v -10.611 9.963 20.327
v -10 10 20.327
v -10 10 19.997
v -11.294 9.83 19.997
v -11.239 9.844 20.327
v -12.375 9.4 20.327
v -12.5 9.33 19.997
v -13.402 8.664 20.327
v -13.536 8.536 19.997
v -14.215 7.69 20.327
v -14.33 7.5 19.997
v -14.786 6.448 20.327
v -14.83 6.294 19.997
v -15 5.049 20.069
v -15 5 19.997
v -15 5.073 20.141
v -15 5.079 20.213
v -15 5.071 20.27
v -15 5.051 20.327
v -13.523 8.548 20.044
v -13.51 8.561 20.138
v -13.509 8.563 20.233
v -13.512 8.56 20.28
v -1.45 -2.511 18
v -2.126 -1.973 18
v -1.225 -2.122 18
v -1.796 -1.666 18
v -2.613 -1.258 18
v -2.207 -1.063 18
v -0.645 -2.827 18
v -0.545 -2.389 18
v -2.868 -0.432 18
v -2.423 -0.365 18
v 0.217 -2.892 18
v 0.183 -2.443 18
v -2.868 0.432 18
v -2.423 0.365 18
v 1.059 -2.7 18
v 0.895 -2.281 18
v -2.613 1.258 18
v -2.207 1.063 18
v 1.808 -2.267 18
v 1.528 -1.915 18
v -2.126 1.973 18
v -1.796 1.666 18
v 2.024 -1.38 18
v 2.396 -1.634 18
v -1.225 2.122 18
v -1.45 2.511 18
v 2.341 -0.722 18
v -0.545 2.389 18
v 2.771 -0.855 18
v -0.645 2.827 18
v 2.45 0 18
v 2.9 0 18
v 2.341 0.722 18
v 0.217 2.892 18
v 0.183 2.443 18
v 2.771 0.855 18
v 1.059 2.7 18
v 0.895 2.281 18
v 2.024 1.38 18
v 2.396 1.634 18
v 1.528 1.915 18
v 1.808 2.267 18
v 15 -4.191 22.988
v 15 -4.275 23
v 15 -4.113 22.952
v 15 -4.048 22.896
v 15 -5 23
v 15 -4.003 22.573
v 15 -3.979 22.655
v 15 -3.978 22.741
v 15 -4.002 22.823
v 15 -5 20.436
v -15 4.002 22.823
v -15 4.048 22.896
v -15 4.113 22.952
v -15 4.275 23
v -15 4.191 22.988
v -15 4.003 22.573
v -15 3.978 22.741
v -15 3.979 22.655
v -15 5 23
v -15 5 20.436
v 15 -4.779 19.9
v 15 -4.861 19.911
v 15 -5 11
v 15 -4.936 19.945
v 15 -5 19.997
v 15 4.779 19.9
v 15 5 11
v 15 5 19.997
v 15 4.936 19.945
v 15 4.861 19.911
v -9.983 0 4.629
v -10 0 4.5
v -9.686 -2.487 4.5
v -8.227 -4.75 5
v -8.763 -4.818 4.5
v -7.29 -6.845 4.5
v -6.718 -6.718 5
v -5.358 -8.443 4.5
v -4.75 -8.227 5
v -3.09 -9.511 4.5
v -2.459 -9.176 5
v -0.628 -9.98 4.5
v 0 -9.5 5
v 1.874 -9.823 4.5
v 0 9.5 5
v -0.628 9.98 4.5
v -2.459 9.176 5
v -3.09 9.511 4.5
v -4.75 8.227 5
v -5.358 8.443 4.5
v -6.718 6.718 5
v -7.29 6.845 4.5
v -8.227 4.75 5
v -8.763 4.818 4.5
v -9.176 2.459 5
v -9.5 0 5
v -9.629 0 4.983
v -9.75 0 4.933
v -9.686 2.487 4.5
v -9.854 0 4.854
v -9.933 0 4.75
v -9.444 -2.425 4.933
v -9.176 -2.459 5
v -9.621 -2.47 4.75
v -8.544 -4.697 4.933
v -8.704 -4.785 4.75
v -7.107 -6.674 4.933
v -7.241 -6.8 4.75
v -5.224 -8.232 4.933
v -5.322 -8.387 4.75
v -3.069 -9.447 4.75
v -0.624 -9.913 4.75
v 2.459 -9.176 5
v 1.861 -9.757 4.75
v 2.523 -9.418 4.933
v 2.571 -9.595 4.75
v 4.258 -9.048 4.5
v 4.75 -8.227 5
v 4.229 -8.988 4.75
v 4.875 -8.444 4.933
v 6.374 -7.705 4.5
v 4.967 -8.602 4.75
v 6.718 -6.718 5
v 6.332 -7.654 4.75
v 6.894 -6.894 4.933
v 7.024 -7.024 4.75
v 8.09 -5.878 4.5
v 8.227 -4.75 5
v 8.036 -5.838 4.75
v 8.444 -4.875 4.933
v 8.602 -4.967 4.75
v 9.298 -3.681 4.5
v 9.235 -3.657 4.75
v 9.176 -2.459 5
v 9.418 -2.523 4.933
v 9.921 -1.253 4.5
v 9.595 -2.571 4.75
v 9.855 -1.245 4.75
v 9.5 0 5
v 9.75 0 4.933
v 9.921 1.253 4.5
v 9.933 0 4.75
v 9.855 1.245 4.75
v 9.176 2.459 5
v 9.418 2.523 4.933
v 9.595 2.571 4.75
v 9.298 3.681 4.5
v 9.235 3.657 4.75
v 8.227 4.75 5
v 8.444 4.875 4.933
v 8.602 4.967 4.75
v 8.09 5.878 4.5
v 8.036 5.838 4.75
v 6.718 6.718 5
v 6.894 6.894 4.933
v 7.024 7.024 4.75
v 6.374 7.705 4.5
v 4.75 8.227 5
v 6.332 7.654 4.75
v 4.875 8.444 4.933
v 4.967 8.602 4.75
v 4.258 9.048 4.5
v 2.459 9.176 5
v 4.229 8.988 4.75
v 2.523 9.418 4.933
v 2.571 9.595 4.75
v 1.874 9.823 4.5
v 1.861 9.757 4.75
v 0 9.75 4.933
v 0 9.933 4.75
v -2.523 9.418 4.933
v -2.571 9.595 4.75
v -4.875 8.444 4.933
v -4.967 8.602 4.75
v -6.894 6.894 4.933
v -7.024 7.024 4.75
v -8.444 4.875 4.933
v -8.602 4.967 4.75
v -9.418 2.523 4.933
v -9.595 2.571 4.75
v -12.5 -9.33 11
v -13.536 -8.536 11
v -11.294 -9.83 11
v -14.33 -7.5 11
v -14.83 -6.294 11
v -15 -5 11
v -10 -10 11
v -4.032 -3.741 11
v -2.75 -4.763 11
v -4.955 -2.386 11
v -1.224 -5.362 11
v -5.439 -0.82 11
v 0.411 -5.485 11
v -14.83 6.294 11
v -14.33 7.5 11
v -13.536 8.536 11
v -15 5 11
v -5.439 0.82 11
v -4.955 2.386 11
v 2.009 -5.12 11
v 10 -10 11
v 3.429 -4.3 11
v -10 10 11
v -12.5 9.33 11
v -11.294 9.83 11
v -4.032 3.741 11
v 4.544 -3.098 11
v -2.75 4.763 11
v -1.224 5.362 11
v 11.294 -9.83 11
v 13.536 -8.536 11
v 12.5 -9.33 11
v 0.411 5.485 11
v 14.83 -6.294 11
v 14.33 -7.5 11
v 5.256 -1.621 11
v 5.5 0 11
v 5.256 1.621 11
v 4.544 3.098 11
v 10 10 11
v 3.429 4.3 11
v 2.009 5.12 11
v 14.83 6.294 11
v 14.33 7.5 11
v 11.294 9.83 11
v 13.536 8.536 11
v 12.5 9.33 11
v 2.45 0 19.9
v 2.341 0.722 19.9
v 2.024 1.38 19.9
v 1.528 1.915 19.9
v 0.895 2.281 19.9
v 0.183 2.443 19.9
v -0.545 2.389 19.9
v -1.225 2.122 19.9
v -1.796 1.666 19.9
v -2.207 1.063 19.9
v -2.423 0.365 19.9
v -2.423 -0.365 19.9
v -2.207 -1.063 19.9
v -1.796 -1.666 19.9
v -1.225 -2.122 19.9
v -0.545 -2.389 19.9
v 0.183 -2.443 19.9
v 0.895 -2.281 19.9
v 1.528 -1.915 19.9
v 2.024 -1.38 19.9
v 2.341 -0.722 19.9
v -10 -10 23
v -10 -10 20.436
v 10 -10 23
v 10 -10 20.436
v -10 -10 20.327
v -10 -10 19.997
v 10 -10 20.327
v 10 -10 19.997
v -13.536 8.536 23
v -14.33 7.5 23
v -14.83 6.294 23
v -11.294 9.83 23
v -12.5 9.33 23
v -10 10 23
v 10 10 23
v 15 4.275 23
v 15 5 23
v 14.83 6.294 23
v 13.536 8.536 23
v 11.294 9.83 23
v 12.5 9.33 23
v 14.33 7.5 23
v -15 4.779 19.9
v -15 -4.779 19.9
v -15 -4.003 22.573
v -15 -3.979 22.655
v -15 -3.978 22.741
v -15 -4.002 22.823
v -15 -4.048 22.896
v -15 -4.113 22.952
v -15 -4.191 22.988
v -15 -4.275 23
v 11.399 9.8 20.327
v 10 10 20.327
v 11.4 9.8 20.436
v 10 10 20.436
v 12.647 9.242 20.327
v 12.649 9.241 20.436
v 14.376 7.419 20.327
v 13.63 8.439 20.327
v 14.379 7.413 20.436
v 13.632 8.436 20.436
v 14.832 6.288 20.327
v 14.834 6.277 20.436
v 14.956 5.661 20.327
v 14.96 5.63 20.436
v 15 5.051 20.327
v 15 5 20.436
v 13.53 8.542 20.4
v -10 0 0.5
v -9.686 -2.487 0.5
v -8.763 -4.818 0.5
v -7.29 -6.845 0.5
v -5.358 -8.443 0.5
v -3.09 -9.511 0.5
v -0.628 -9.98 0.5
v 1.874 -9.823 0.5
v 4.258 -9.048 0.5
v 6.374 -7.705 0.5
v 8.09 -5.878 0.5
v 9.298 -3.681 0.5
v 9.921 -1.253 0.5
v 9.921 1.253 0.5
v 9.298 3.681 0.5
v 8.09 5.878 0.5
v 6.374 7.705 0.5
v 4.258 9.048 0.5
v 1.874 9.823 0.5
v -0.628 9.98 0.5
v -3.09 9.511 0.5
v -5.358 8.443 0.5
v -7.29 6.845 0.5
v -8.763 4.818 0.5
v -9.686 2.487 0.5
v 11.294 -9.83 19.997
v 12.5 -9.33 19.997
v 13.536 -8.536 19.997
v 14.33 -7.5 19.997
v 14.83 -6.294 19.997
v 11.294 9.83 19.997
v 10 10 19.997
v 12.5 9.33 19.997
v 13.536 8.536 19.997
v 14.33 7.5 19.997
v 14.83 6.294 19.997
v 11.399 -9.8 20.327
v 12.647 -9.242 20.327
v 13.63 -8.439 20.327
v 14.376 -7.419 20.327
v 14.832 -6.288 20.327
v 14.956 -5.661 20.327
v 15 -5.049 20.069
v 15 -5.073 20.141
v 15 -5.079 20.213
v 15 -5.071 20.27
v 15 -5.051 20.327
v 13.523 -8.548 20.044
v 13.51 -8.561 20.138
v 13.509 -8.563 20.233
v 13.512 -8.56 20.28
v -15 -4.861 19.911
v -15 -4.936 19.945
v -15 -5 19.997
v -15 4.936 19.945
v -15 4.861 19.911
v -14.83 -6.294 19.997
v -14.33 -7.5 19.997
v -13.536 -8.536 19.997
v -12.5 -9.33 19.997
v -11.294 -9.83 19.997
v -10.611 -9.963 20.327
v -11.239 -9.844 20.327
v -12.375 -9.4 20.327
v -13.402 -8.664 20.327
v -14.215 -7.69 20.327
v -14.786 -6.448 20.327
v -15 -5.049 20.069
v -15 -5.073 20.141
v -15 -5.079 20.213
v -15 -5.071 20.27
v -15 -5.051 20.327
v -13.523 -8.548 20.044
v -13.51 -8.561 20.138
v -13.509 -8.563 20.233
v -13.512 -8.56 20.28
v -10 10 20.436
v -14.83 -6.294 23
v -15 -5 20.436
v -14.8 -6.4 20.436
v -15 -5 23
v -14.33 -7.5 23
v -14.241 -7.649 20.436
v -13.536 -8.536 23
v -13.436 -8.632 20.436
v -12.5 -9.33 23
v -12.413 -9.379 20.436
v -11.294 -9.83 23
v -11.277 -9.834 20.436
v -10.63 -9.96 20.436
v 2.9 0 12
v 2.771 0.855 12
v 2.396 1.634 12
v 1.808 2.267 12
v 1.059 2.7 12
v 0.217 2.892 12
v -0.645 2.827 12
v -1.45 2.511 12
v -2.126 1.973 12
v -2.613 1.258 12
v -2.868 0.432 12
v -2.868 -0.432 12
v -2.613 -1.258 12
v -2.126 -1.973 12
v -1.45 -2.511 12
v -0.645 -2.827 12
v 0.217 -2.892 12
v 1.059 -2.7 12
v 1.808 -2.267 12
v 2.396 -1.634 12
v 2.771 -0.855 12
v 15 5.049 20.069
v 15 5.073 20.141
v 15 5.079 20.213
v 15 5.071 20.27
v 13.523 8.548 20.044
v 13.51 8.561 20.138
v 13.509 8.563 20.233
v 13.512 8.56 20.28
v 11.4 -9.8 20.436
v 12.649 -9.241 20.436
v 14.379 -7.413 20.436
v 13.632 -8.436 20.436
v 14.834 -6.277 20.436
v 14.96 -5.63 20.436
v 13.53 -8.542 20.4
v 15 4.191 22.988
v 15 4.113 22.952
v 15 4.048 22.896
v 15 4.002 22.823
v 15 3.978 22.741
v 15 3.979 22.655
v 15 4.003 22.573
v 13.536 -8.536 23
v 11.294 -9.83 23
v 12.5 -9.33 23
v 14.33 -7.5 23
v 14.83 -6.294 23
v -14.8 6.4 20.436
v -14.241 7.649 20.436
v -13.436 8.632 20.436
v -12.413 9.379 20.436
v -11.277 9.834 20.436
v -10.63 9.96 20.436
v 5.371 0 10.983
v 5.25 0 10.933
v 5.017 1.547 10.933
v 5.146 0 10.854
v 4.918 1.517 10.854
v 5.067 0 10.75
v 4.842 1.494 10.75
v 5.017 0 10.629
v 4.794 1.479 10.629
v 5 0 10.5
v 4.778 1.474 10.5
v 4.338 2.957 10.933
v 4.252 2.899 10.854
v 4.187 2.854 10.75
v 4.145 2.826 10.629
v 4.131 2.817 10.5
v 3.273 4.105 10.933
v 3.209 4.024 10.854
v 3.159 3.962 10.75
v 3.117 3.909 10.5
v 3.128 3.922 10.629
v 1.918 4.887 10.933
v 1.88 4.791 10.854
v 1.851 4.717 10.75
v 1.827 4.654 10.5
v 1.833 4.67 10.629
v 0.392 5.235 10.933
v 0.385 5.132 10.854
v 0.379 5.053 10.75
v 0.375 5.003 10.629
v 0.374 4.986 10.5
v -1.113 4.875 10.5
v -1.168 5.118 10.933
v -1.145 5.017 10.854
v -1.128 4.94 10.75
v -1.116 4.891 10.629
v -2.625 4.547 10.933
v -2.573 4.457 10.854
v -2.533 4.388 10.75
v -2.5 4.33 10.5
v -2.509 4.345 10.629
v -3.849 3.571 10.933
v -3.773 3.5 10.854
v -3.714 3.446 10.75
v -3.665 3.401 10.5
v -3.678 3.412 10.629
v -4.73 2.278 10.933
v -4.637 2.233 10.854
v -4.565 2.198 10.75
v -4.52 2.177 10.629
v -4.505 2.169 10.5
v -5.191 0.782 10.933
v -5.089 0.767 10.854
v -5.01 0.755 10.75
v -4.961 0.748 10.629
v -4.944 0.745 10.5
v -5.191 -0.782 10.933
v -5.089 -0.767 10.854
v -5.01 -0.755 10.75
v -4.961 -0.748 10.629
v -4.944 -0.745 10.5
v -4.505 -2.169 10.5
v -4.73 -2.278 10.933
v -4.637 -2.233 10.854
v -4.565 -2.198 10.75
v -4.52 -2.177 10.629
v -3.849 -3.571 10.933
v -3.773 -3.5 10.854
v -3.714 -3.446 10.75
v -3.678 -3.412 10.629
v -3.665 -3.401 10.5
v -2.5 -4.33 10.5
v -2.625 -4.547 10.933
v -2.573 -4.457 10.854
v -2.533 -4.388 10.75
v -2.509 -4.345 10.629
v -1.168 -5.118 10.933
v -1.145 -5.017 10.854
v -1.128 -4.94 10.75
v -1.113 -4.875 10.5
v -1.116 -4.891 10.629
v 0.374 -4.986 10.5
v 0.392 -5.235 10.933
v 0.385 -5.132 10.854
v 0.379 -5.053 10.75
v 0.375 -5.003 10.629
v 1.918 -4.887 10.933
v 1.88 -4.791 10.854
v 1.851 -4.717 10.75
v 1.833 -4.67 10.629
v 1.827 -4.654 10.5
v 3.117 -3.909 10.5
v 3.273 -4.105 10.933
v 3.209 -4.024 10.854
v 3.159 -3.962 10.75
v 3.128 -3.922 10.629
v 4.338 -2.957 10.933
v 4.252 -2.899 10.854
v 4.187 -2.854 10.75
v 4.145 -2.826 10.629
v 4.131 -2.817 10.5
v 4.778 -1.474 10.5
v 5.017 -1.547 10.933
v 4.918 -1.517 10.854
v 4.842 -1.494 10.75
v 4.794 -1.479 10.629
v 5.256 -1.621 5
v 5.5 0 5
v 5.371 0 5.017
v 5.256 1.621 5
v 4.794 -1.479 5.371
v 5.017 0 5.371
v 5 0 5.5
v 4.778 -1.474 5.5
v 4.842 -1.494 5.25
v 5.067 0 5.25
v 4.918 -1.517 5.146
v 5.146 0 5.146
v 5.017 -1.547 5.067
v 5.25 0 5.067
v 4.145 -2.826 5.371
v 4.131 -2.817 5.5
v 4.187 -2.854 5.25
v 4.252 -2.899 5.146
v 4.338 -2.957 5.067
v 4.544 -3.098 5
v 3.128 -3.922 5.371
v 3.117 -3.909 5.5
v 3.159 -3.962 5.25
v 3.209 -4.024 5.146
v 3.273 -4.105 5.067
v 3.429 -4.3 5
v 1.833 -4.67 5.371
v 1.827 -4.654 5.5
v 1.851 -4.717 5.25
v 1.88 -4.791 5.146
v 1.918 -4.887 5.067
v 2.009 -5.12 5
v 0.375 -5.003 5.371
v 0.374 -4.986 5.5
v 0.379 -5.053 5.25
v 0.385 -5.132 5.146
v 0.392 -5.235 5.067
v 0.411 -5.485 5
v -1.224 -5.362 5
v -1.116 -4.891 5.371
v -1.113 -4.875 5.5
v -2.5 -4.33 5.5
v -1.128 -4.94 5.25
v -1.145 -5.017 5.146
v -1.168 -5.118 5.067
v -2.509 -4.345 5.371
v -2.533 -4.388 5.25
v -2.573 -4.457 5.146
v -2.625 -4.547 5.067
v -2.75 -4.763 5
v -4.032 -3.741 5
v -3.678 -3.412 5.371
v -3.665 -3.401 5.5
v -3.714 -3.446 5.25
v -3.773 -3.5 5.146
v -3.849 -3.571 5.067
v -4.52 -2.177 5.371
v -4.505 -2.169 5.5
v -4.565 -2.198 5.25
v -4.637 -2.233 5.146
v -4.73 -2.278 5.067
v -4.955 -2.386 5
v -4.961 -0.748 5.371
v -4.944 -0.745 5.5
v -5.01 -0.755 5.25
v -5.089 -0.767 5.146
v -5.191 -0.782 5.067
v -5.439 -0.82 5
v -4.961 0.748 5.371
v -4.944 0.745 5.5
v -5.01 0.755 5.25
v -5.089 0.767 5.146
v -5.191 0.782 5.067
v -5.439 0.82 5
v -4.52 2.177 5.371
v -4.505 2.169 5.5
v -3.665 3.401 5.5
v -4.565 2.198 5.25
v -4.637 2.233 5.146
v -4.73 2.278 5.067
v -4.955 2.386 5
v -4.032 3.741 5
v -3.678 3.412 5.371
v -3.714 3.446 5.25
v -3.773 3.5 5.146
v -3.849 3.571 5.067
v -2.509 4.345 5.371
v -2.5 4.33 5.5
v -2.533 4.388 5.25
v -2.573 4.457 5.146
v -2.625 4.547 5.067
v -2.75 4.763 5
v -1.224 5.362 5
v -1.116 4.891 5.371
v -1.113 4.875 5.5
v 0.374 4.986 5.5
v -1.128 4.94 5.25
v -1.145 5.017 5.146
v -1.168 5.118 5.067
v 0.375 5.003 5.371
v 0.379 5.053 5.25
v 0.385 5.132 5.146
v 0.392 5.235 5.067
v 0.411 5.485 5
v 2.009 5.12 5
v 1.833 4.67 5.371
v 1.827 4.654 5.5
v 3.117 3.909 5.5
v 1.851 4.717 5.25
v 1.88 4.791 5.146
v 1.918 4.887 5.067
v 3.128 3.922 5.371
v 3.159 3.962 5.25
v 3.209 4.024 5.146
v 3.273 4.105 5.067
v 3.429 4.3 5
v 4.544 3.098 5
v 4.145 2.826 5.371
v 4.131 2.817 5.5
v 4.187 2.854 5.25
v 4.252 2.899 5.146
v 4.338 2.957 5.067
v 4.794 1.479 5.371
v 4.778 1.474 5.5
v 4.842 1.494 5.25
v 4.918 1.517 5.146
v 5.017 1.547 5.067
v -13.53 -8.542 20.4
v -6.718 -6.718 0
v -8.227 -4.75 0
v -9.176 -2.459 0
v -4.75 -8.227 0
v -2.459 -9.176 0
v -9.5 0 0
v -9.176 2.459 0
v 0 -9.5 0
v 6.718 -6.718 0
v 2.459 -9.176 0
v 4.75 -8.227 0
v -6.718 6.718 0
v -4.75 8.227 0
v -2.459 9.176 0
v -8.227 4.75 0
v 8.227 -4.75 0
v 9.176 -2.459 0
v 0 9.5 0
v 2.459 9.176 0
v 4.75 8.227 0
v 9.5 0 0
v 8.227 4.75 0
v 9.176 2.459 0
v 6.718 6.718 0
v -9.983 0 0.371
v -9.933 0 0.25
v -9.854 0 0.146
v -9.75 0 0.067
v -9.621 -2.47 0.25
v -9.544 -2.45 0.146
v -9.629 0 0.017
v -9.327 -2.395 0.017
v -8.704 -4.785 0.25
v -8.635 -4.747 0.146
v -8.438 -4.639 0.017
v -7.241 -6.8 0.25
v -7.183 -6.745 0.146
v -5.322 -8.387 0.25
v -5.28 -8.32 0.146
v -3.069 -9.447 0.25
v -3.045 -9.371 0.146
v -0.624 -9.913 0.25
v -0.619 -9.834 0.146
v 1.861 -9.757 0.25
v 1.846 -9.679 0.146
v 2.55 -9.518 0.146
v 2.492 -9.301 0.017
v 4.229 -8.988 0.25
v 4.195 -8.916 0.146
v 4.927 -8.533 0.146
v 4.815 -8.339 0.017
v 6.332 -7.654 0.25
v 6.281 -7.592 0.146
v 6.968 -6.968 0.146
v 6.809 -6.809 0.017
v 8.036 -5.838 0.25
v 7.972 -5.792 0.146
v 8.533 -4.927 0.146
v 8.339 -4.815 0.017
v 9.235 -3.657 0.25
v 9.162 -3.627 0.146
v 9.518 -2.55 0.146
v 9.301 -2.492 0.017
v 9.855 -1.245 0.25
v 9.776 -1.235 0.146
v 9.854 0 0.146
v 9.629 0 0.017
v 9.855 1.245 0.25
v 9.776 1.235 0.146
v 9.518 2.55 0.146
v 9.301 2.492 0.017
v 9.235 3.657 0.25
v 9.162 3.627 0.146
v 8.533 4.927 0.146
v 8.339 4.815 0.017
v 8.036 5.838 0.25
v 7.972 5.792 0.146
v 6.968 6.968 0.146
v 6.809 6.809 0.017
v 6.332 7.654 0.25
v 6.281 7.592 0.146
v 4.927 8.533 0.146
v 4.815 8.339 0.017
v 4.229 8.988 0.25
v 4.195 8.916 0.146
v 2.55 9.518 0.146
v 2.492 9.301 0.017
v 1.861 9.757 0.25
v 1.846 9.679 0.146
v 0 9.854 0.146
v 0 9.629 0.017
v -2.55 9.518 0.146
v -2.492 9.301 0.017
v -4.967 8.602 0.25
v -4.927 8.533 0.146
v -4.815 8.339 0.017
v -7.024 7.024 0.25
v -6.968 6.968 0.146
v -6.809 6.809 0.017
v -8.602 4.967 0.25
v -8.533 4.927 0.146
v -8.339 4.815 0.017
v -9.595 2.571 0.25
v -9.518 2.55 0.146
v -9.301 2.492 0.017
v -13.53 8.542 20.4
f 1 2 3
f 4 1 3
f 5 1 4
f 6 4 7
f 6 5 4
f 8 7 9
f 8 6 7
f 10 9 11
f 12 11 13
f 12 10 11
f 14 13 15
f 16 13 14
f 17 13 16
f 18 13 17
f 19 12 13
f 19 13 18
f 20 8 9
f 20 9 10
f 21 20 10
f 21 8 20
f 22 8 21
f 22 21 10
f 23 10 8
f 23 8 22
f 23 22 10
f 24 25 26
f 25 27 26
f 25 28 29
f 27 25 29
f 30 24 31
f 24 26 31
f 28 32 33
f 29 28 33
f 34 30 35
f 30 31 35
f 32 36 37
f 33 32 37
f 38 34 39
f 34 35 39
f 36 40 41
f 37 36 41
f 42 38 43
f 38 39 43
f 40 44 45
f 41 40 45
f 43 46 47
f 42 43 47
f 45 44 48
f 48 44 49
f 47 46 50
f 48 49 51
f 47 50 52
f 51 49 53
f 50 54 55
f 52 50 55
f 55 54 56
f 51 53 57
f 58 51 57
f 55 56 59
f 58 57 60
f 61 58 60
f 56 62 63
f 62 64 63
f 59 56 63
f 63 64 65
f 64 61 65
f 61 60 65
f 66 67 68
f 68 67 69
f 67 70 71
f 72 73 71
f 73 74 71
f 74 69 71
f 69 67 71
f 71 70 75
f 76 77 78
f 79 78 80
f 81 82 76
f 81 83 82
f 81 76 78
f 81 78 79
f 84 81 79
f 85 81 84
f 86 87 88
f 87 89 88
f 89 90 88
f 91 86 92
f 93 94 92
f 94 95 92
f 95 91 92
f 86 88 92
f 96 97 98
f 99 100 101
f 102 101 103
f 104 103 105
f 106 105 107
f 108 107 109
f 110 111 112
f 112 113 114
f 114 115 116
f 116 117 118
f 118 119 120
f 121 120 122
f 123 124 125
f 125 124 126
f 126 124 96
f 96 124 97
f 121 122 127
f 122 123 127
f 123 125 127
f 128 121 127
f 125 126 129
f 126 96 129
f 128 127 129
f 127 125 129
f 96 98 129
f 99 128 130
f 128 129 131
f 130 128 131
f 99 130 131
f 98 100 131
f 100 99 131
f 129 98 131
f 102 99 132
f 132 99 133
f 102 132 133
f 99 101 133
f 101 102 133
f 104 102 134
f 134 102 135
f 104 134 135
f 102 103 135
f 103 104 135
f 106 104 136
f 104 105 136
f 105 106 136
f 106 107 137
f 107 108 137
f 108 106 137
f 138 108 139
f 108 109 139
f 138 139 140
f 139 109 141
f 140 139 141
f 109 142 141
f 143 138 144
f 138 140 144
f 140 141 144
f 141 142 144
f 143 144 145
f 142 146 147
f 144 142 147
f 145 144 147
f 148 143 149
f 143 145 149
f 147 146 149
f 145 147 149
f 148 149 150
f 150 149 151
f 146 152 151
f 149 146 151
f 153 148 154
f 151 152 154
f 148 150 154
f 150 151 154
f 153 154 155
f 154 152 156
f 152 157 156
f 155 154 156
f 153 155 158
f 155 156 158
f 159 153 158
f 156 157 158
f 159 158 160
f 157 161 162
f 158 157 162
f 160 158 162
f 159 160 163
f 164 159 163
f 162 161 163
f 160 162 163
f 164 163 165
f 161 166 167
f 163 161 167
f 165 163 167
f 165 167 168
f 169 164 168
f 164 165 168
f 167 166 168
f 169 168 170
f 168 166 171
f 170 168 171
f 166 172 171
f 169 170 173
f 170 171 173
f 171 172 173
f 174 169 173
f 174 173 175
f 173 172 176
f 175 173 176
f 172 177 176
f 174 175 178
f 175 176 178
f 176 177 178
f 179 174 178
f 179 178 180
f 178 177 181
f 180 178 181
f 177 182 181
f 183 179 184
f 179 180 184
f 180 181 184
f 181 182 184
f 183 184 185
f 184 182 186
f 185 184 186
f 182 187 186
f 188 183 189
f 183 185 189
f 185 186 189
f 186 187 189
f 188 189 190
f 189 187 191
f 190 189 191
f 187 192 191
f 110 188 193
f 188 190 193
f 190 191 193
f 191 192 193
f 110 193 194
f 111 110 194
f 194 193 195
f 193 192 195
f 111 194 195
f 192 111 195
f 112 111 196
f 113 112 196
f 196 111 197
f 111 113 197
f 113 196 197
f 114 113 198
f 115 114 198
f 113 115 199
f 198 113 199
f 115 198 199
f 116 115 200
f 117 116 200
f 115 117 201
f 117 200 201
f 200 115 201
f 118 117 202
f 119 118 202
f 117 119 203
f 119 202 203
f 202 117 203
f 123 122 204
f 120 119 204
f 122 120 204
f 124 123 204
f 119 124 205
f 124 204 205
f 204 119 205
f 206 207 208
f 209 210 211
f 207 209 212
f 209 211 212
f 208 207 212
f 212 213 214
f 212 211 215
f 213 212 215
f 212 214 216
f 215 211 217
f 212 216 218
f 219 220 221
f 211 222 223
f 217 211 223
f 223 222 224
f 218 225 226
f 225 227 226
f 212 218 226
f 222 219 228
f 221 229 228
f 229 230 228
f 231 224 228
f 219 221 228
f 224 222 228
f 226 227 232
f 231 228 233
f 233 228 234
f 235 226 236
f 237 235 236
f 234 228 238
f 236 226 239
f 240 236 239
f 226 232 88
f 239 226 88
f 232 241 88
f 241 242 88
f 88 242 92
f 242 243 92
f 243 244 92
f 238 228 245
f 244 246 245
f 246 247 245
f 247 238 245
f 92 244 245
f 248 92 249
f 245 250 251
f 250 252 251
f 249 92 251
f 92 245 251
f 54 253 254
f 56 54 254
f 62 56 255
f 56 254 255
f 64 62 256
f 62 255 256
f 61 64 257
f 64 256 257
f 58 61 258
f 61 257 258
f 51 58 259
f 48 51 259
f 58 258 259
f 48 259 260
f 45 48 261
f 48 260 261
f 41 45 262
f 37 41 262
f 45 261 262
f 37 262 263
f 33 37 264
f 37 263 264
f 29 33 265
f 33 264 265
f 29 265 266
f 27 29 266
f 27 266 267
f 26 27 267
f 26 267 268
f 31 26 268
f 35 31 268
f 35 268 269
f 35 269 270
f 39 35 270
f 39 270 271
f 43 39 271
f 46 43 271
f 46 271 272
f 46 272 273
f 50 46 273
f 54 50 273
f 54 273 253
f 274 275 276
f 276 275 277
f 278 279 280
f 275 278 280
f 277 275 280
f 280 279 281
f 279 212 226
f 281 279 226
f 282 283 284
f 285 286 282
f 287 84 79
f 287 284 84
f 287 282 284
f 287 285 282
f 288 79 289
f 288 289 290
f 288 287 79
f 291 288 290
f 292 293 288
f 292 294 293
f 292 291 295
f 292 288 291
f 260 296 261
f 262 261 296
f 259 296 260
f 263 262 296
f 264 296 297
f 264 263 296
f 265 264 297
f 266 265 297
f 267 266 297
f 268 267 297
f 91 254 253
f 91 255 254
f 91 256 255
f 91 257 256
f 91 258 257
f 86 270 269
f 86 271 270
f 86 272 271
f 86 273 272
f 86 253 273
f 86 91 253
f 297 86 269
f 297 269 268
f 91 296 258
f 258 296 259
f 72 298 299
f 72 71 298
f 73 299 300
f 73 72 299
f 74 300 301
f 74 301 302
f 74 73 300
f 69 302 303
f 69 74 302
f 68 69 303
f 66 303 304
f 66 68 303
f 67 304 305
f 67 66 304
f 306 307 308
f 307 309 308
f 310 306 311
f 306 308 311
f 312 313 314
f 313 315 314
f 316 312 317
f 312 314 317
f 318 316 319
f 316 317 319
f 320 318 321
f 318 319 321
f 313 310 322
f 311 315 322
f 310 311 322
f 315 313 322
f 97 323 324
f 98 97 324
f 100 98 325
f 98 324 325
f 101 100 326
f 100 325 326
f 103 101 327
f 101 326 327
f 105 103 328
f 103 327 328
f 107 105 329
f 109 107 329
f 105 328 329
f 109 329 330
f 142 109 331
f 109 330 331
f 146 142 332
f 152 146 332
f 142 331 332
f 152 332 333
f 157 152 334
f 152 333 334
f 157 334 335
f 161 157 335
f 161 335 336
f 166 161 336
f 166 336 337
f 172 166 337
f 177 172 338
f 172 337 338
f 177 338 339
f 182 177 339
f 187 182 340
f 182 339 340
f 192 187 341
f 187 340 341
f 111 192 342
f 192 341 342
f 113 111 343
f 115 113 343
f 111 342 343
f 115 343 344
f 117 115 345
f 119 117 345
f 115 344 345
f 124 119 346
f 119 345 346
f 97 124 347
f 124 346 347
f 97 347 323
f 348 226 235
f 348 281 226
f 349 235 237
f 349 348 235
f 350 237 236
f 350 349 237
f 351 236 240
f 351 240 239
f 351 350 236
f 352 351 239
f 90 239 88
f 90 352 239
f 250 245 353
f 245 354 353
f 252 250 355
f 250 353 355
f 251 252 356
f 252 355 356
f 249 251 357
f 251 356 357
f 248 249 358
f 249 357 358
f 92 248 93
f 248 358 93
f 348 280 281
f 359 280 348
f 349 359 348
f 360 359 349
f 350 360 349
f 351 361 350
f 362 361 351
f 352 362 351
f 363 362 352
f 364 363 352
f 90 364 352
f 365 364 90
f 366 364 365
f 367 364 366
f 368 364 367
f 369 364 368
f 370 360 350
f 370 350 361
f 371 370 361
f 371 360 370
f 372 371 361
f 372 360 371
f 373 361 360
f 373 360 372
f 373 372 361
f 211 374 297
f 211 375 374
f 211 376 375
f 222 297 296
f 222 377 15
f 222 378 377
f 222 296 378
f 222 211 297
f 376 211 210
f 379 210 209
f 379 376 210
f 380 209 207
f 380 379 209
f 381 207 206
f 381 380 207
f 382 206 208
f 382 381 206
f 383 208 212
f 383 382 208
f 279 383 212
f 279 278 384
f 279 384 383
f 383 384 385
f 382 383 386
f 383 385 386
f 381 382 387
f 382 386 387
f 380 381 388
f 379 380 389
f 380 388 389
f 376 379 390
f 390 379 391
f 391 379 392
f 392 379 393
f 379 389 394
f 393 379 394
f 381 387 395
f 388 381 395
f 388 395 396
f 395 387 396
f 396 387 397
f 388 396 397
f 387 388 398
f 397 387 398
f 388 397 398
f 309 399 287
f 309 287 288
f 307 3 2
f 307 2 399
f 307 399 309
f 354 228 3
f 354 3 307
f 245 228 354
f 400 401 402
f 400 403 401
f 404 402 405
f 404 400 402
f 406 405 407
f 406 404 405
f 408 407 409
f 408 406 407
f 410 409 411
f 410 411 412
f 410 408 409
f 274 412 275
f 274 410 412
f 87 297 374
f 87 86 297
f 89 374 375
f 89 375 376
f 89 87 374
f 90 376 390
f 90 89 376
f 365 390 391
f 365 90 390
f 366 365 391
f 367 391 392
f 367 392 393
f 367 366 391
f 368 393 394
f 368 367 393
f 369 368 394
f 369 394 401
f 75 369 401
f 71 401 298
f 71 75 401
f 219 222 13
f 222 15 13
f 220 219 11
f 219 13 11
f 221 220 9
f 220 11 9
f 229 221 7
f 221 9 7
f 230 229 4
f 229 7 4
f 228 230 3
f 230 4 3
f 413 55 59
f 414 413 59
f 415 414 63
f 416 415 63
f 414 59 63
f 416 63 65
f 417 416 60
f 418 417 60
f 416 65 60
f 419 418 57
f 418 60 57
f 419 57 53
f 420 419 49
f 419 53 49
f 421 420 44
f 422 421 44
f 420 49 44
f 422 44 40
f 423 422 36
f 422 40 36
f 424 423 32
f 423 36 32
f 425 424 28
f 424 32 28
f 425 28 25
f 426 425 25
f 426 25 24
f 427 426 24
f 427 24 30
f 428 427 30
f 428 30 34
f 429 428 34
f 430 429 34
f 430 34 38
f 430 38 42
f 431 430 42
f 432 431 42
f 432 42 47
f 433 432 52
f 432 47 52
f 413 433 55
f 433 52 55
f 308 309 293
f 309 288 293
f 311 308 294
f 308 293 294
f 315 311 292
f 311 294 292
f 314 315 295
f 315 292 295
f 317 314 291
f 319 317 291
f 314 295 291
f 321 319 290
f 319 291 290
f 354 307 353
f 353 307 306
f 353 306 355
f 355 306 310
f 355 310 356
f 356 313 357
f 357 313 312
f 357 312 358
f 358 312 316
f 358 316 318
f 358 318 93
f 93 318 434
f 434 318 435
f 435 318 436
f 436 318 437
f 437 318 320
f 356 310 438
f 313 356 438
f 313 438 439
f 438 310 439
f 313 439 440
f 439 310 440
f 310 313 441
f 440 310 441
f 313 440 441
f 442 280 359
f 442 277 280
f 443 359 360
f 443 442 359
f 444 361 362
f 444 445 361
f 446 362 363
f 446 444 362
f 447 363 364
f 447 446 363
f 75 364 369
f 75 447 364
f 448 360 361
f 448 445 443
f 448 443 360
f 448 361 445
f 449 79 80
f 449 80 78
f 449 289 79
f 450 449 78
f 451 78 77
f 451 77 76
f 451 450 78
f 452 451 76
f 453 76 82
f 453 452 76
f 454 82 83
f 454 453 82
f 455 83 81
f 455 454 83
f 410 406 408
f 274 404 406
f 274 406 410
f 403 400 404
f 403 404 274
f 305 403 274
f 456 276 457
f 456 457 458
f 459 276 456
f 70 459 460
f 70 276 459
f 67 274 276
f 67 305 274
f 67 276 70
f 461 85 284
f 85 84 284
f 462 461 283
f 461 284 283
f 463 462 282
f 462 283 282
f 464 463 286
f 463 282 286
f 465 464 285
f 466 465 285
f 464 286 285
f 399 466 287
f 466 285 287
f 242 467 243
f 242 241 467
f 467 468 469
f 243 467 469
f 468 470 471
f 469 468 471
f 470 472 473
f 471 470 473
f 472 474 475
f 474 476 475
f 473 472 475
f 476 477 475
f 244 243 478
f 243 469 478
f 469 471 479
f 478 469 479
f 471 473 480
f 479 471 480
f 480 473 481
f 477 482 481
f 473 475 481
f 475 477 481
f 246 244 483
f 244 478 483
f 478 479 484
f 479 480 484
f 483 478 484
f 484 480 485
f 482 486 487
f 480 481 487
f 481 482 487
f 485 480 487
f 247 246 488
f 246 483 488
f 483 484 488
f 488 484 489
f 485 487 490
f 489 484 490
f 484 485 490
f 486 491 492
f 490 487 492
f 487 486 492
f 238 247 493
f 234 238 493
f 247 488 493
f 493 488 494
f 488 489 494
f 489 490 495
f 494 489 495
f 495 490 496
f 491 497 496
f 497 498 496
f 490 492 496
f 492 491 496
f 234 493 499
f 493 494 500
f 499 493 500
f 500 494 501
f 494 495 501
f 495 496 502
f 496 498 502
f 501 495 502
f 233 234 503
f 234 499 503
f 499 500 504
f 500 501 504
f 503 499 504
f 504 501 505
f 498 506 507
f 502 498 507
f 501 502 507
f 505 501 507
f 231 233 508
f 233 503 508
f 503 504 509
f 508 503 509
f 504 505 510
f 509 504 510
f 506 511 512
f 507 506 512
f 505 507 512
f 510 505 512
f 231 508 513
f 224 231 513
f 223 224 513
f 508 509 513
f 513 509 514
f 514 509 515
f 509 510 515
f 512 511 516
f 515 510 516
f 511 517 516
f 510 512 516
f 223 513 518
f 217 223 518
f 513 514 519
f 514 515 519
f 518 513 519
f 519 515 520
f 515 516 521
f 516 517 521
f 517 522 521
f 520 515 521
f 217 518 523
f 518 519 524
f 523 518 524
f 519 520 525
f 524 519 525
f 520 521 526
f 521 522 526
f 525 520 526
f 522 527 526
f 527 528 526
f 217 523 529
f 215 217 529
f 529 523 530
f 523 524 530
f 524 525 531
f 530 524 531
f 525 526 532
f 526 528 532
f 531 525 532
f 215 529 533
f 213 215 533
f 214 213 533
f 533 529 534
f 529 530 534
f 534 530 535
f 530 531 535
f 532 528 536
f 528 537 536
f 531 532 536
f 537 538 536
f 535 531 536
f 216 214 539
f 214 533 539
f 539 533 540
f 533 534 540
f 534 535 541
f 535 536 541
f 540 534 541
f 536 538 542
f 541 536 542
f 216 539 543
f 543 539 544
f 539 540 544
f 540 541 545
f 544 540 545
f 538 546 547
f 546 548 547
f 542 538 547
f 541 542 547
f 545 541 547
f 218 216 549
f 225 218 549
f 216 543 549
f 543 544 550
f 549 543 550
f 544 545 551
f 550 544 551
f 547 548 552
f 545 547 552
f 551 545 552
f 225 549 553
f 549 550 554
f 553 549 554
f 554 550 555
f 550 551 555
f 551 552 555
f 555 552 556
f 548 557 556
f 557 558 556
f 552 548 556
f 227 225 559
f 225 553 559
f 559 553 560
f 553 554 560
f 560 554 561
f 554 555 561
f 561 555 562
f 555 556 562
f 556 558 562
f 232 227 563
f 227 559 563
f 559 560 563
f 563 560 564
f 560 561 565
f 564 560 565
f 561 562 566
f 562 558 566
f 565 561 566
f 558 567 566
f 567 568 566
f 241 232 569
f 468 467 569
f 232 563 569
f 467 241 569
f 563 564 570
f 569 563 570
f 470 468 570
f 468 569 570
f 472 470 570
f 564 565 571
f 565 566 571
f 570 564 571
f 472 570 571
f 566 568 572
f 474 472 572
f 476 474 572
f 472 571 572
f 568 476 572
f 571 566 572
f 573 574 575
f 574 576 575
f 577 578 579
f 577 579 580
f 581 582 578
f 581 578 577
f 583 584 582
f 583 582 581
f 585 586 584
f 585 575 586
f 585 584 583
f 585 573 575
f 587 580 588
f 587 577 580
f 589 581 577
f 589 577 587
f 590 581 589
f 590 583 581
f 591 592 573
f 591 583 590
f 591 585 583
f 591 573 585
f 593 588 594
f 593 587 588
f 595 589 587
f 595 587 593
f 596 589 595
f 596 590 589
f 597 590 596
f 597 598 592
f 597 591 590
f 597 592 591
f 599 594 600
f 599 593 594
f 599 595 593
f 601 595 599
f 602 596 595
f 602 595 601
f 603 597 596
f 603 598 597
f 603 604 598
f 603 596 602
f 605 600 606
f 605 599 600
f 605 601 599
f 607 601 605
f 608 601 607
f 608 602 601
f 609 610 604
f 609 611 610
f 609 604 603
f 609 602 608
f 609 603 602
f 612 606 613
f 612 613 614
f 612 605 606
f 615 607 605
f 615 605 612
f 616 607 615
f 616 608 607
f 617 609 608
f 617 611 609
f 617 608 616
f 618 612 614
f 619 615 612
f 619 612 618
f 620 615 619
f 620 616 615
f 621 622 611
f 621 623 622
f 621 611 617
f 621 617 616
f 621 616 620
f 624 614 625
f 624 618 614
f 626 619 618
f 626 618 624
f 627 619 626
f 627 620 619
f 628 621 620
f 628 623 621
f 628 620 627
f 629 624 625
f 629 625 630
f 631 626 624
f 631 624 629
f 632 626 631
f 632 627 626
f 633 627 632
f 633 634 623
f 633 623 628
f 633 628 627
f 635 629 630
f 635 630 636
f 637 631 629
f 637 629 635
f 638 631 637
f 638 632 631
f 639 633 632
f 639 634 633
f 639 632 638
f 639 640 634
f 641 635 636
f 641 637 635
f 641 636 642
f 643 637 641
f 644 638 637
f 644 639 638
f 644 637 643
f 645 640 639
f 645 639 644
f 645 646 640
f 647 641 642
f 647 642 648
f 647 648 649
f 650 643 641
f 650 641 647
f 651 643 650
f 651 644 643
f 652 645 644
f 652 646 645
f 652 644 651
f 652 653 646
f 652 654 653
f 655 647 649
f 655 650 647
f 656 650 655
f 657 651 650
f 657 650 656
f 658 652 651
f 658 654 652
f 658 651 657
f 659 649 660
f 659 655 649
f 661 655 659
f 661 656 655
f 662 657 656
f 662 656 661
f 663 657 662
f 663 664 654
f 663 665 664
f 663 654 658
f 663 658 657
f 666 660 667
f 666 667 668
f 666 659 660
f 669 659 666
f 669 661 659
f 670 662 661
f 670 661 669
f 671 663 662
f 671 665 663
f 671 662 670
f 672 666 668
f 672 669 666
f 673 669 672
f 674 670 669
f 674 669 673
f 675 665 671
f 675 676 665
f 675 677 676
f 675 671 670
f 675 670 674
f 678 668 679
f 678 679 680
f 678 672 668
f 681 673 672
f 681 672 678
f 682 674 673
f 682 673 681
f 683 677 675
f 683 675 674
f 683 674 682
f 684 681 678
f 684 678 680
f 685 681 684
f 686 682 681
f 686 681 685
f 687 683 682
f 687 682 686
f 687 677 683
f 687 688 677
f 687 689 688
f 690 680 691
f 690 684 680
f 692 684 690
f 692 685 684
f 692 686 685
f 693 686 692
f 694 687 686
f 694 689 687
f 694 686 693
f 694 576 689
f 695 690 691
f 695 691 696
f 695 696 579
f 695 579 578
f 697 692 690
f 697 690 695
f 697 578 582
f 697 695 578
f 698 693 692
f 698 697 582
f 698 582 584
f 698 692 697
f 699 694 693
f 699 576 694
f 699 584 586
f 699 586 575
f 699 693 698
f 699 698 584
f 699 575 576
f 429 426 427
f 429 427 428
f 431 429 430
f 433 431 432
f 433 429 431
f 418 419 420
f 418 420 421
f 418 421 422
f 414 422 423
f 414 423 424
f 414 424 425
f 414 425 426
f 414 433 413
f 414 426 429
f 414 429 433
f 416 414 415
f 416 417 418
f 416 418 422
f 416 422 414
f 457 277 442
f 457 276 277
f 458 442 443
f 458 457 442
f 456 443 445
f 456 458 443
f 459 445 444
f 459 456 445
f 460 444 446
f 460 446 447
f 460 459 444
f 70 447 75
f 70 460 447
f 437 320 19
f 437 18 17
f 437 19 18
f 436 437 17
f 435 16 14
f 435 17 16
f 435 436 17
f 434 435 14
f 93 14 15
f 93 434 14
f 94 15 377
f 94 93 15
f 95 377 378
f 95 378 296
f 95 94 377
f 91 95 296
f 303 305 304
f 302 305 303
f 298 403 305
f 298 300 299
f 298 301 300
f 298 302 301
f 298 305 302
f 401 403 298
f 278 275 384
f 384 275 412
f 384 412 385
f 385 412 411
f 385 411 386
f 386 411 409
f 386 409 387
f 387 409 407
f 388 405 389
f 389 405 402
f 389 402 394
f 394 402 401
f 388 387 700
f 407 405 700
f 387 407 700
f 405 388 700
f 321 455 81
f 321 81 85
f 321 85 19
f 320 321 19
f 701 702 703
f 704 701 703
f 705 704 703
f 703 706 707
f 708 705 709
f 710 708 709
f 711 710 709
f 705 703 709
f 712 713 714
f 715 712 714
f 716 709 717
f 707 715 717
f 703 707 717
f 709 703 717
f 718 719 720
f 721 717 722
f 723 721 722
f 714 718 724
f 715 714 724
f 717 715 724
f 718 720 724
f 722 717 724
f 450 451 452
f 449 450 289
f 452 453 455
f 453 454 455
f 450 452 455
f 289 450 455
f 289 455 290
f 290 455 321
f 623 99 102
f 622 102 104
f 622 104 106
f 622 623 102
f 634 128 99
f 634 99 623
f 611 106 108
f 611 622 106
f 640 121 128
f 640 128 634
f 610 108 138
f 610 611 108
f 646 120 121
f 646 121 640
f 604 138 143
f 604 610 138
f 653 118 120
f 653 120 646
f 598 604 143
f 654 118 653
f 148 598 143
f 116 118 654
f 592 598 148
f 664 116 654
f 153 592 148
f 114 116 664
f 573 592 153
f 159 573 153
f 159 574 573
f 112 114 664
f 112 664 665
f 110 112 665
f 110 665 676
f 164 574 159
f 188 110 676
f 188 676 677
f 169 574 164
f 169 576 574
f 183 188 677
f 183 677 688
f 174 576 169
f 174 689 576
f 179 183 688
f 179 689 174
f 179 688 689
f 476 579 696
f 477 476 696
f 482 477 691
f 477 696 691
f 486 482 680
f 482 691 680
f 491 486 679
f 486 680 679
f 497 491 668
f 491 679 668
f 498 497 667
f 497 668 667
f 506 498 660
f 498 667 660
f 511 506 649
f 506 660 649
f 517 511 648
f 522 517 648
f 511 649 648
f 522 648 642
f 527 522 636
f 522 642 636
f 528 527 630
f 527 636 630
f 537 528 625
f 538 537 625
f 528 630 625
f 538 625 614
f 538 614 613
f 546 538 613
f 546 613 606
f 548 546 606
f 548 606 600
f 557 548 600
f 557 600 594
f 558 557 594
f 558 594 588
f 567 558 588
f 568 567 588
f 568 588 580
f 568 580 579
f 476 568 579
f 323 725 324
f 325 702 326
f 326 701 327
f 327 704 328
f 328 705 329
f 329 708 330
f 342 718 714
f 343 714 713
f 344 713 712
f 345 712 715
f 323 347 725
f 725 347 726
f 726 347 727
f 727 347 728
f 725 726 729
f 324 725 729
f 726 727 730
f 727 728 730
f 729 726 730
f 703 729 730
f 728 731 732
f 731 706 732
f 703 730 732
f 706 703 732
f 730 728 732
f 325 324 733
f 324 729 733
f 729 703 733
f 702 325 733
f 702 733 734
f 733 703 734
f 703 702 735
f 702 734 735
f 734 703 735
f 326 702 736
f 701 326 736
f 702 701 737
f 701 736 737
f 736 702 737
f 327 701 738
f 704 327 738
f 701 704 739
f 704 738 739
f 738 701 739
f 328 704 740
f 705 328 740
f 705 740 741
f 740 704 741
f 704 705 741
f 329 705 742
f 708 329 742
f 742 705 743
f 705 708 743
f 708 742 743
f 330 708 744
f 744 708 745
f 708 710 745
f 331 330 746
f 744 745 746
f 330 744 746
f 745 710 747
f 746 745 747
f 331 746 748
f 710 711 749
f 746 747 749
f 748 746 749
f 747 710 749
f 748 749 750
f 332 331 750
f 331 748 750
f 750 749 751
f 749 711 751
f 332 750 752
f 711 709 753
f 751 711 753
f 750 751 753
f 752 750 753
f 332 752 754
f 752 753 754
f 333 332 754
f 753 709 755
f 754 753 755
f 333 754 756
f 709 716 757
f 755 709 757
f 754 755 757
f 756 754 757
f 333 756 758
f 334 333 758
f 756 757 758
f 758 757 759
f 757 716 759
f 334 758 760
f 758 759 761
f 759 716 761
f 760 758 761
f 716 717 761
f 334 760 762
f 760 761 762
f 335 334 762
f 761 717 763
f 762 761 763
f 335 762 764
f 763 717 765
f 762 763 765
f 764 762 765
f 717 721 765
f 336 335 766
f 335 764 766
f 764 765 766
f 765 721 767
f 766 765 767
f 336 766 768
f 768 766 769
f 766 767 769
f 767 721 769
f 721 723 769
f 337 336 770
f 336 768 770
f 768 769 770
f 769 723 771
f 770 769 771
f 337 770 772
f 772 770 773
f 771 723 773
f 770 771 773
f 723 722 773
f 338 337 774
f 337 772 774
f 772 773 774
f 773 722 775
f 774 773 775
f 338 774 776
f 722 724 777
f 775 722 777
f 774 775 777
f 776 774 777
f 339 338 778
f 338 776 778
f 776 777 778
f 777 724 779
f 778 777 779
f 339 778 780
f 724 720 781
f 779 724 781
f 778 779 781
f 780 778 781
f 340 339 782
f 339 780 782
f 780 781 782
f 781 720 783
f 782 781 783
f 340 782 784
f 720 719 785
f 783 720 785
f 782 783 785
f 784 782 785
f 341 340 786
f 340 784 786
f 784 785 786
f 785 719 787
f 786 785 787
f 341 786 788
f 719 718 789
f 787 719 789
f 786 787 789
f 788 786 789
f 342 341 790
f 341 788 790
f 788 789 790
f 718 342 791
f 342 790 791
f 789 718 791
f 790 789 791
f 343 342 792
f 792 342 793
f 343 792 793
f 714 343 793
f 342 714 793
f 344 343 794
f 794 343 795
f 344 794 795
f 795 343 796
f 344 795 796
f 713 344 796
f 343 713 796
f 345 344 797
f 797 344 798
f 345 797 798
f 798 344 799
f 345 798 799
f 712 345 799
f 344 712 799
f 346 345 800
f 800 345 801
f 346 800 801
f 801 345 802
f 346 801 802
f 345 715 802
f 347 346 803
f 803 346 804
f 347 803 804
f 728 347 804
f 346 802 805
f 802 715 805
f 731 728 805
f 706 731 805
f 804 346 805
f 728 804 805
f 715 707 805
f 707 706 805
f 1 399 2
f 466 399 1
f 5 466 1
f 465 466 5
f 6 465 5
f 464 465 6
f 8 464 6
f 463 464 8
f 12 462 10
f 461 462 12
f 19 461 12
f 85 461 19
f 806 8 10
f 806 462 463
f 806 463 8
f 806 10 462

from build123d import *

# Parameters (mm, degrees)
BOSS_EXTRUDE1_DEPTH     = 5
SKETCH2_R               = 5
BOSS_EXTRUDE2_DEPTH     = 11
SKETCH3_W               = 30
SKETCH3_H               = 20
BOSS_EXTRUDE3_DEPTH     = 12
CUT_EXTRUDE1_DEPTH      = 26
CUT_EXTRUDE1_DEPTH_BACK = 6
SKETCH6_R               = 2.45
CUT_EXTRUDE2_DEPTH      = 5
FILLET1_R               = 0.3
FILLET2_R               = 5
FILLET3_R               = 0.5
SKETCH7_R               = 2.9
CUT_EXTRUDE3_DEPTH      = 6


with BuildPart() as part:
    # Sketch1 → Boss-Extrude1 (new body)
    with BuildSketch(Plane.XY):
        with BuildLine():
            ThreePointArc((10, 0), (0, 10), (-10, 0))
            ThreePointArc((-10, 0), (0, -10), (10, 0))
        make_face()
    extrude(amount=BOSS_EXTRUDE1_DEPTH)

    # Sketch2 → Boss-Extrude2 (add)
    with BuildSketch(Plane.XY):
        Circle(SKETCH2_R)
    extrude(amount=BOSS_EXTRUDE2_DEPTH)

    # Sketch3 → Boss-Extrude3 (add)
    with BuildSketch(Plane.XY.offset(11)):
        Rectangle(SKETCH3_W, SKETCH3_H)
    extrude(amount=BOSS_EXTRUDE3_DEPTH)

    # Sketch5 → Cut-Extrude1 (cut, two sides)
    with BuildSketch(Plane(origin=(-10, 0, 0), x_dir=(0, 0, -1), z_dir=(1, 0, 0))) as cut_extrude1_sk:
        Polygon((-23, 3.80444626), (-19.9, 5.25), (-19.9, -5.25), (-23, -3.80444626), align=None)
    extrude(amount=CUT_EXTRUDE1_DEPTH, mode=Mode.SUBTRACT)
    extrude(cut_extrude1_sk.sketch, amount=-CUT_EXTRUDE1_DEPTH_BACK, mode=Mode.SUBTRACT)

    # Sketch6 → Cut-Extrude2 (cut)
    with BuildSketch(Plane.XY.offset(23)):
        Circle(SKETCH6_R)
    extrude(amount=-CUT_EXTRUDE2_DEPTH, mode=Mode.SUBTRACT)

    # Fillet1
    fillet1_edges = [part.edges().sort_by_distance(p)[0] for p in [
        (0, 3.80444626, 23),
        (0, -3.80444626, 23),
        (0, -5.25, 19.9),
        (0, 5.25, 19.9),
    ]]
    fillet(fillet1_edges, radius=FILLET1_R)

    # Fillet2
    fillet2_edges = [part.edges().sort_by_distance(p)[0] for p in [
        (15, -10, 17),
        (15, 10, 17),
        (-15, 10, 17),
        (-15, -10, 17),
    ]]
    fillet(fillet2_edges, radius=FILLET2_R)

    # Fillet3
    fillet3_edges = [part.edges().sort_by_distance(p)[0] for p in [
        (-5, 0, 11),
        (10, 0, 0),
        (10, 0, 5),
        (-5, 0, 5),
    ]]
    fillet(fillet3_edges, radius=FILLET3_R)

    # Sketch7 → Cut-Extrude3 (cut)
    with BuildSketch(Plane.XY.offset(18)):
        Circle(SKETCH7_R)
    extrude(amount=-CUT_EXTRUDE3_DEPTH, mode=Mode.SUBTRACT)


solid = part.part
